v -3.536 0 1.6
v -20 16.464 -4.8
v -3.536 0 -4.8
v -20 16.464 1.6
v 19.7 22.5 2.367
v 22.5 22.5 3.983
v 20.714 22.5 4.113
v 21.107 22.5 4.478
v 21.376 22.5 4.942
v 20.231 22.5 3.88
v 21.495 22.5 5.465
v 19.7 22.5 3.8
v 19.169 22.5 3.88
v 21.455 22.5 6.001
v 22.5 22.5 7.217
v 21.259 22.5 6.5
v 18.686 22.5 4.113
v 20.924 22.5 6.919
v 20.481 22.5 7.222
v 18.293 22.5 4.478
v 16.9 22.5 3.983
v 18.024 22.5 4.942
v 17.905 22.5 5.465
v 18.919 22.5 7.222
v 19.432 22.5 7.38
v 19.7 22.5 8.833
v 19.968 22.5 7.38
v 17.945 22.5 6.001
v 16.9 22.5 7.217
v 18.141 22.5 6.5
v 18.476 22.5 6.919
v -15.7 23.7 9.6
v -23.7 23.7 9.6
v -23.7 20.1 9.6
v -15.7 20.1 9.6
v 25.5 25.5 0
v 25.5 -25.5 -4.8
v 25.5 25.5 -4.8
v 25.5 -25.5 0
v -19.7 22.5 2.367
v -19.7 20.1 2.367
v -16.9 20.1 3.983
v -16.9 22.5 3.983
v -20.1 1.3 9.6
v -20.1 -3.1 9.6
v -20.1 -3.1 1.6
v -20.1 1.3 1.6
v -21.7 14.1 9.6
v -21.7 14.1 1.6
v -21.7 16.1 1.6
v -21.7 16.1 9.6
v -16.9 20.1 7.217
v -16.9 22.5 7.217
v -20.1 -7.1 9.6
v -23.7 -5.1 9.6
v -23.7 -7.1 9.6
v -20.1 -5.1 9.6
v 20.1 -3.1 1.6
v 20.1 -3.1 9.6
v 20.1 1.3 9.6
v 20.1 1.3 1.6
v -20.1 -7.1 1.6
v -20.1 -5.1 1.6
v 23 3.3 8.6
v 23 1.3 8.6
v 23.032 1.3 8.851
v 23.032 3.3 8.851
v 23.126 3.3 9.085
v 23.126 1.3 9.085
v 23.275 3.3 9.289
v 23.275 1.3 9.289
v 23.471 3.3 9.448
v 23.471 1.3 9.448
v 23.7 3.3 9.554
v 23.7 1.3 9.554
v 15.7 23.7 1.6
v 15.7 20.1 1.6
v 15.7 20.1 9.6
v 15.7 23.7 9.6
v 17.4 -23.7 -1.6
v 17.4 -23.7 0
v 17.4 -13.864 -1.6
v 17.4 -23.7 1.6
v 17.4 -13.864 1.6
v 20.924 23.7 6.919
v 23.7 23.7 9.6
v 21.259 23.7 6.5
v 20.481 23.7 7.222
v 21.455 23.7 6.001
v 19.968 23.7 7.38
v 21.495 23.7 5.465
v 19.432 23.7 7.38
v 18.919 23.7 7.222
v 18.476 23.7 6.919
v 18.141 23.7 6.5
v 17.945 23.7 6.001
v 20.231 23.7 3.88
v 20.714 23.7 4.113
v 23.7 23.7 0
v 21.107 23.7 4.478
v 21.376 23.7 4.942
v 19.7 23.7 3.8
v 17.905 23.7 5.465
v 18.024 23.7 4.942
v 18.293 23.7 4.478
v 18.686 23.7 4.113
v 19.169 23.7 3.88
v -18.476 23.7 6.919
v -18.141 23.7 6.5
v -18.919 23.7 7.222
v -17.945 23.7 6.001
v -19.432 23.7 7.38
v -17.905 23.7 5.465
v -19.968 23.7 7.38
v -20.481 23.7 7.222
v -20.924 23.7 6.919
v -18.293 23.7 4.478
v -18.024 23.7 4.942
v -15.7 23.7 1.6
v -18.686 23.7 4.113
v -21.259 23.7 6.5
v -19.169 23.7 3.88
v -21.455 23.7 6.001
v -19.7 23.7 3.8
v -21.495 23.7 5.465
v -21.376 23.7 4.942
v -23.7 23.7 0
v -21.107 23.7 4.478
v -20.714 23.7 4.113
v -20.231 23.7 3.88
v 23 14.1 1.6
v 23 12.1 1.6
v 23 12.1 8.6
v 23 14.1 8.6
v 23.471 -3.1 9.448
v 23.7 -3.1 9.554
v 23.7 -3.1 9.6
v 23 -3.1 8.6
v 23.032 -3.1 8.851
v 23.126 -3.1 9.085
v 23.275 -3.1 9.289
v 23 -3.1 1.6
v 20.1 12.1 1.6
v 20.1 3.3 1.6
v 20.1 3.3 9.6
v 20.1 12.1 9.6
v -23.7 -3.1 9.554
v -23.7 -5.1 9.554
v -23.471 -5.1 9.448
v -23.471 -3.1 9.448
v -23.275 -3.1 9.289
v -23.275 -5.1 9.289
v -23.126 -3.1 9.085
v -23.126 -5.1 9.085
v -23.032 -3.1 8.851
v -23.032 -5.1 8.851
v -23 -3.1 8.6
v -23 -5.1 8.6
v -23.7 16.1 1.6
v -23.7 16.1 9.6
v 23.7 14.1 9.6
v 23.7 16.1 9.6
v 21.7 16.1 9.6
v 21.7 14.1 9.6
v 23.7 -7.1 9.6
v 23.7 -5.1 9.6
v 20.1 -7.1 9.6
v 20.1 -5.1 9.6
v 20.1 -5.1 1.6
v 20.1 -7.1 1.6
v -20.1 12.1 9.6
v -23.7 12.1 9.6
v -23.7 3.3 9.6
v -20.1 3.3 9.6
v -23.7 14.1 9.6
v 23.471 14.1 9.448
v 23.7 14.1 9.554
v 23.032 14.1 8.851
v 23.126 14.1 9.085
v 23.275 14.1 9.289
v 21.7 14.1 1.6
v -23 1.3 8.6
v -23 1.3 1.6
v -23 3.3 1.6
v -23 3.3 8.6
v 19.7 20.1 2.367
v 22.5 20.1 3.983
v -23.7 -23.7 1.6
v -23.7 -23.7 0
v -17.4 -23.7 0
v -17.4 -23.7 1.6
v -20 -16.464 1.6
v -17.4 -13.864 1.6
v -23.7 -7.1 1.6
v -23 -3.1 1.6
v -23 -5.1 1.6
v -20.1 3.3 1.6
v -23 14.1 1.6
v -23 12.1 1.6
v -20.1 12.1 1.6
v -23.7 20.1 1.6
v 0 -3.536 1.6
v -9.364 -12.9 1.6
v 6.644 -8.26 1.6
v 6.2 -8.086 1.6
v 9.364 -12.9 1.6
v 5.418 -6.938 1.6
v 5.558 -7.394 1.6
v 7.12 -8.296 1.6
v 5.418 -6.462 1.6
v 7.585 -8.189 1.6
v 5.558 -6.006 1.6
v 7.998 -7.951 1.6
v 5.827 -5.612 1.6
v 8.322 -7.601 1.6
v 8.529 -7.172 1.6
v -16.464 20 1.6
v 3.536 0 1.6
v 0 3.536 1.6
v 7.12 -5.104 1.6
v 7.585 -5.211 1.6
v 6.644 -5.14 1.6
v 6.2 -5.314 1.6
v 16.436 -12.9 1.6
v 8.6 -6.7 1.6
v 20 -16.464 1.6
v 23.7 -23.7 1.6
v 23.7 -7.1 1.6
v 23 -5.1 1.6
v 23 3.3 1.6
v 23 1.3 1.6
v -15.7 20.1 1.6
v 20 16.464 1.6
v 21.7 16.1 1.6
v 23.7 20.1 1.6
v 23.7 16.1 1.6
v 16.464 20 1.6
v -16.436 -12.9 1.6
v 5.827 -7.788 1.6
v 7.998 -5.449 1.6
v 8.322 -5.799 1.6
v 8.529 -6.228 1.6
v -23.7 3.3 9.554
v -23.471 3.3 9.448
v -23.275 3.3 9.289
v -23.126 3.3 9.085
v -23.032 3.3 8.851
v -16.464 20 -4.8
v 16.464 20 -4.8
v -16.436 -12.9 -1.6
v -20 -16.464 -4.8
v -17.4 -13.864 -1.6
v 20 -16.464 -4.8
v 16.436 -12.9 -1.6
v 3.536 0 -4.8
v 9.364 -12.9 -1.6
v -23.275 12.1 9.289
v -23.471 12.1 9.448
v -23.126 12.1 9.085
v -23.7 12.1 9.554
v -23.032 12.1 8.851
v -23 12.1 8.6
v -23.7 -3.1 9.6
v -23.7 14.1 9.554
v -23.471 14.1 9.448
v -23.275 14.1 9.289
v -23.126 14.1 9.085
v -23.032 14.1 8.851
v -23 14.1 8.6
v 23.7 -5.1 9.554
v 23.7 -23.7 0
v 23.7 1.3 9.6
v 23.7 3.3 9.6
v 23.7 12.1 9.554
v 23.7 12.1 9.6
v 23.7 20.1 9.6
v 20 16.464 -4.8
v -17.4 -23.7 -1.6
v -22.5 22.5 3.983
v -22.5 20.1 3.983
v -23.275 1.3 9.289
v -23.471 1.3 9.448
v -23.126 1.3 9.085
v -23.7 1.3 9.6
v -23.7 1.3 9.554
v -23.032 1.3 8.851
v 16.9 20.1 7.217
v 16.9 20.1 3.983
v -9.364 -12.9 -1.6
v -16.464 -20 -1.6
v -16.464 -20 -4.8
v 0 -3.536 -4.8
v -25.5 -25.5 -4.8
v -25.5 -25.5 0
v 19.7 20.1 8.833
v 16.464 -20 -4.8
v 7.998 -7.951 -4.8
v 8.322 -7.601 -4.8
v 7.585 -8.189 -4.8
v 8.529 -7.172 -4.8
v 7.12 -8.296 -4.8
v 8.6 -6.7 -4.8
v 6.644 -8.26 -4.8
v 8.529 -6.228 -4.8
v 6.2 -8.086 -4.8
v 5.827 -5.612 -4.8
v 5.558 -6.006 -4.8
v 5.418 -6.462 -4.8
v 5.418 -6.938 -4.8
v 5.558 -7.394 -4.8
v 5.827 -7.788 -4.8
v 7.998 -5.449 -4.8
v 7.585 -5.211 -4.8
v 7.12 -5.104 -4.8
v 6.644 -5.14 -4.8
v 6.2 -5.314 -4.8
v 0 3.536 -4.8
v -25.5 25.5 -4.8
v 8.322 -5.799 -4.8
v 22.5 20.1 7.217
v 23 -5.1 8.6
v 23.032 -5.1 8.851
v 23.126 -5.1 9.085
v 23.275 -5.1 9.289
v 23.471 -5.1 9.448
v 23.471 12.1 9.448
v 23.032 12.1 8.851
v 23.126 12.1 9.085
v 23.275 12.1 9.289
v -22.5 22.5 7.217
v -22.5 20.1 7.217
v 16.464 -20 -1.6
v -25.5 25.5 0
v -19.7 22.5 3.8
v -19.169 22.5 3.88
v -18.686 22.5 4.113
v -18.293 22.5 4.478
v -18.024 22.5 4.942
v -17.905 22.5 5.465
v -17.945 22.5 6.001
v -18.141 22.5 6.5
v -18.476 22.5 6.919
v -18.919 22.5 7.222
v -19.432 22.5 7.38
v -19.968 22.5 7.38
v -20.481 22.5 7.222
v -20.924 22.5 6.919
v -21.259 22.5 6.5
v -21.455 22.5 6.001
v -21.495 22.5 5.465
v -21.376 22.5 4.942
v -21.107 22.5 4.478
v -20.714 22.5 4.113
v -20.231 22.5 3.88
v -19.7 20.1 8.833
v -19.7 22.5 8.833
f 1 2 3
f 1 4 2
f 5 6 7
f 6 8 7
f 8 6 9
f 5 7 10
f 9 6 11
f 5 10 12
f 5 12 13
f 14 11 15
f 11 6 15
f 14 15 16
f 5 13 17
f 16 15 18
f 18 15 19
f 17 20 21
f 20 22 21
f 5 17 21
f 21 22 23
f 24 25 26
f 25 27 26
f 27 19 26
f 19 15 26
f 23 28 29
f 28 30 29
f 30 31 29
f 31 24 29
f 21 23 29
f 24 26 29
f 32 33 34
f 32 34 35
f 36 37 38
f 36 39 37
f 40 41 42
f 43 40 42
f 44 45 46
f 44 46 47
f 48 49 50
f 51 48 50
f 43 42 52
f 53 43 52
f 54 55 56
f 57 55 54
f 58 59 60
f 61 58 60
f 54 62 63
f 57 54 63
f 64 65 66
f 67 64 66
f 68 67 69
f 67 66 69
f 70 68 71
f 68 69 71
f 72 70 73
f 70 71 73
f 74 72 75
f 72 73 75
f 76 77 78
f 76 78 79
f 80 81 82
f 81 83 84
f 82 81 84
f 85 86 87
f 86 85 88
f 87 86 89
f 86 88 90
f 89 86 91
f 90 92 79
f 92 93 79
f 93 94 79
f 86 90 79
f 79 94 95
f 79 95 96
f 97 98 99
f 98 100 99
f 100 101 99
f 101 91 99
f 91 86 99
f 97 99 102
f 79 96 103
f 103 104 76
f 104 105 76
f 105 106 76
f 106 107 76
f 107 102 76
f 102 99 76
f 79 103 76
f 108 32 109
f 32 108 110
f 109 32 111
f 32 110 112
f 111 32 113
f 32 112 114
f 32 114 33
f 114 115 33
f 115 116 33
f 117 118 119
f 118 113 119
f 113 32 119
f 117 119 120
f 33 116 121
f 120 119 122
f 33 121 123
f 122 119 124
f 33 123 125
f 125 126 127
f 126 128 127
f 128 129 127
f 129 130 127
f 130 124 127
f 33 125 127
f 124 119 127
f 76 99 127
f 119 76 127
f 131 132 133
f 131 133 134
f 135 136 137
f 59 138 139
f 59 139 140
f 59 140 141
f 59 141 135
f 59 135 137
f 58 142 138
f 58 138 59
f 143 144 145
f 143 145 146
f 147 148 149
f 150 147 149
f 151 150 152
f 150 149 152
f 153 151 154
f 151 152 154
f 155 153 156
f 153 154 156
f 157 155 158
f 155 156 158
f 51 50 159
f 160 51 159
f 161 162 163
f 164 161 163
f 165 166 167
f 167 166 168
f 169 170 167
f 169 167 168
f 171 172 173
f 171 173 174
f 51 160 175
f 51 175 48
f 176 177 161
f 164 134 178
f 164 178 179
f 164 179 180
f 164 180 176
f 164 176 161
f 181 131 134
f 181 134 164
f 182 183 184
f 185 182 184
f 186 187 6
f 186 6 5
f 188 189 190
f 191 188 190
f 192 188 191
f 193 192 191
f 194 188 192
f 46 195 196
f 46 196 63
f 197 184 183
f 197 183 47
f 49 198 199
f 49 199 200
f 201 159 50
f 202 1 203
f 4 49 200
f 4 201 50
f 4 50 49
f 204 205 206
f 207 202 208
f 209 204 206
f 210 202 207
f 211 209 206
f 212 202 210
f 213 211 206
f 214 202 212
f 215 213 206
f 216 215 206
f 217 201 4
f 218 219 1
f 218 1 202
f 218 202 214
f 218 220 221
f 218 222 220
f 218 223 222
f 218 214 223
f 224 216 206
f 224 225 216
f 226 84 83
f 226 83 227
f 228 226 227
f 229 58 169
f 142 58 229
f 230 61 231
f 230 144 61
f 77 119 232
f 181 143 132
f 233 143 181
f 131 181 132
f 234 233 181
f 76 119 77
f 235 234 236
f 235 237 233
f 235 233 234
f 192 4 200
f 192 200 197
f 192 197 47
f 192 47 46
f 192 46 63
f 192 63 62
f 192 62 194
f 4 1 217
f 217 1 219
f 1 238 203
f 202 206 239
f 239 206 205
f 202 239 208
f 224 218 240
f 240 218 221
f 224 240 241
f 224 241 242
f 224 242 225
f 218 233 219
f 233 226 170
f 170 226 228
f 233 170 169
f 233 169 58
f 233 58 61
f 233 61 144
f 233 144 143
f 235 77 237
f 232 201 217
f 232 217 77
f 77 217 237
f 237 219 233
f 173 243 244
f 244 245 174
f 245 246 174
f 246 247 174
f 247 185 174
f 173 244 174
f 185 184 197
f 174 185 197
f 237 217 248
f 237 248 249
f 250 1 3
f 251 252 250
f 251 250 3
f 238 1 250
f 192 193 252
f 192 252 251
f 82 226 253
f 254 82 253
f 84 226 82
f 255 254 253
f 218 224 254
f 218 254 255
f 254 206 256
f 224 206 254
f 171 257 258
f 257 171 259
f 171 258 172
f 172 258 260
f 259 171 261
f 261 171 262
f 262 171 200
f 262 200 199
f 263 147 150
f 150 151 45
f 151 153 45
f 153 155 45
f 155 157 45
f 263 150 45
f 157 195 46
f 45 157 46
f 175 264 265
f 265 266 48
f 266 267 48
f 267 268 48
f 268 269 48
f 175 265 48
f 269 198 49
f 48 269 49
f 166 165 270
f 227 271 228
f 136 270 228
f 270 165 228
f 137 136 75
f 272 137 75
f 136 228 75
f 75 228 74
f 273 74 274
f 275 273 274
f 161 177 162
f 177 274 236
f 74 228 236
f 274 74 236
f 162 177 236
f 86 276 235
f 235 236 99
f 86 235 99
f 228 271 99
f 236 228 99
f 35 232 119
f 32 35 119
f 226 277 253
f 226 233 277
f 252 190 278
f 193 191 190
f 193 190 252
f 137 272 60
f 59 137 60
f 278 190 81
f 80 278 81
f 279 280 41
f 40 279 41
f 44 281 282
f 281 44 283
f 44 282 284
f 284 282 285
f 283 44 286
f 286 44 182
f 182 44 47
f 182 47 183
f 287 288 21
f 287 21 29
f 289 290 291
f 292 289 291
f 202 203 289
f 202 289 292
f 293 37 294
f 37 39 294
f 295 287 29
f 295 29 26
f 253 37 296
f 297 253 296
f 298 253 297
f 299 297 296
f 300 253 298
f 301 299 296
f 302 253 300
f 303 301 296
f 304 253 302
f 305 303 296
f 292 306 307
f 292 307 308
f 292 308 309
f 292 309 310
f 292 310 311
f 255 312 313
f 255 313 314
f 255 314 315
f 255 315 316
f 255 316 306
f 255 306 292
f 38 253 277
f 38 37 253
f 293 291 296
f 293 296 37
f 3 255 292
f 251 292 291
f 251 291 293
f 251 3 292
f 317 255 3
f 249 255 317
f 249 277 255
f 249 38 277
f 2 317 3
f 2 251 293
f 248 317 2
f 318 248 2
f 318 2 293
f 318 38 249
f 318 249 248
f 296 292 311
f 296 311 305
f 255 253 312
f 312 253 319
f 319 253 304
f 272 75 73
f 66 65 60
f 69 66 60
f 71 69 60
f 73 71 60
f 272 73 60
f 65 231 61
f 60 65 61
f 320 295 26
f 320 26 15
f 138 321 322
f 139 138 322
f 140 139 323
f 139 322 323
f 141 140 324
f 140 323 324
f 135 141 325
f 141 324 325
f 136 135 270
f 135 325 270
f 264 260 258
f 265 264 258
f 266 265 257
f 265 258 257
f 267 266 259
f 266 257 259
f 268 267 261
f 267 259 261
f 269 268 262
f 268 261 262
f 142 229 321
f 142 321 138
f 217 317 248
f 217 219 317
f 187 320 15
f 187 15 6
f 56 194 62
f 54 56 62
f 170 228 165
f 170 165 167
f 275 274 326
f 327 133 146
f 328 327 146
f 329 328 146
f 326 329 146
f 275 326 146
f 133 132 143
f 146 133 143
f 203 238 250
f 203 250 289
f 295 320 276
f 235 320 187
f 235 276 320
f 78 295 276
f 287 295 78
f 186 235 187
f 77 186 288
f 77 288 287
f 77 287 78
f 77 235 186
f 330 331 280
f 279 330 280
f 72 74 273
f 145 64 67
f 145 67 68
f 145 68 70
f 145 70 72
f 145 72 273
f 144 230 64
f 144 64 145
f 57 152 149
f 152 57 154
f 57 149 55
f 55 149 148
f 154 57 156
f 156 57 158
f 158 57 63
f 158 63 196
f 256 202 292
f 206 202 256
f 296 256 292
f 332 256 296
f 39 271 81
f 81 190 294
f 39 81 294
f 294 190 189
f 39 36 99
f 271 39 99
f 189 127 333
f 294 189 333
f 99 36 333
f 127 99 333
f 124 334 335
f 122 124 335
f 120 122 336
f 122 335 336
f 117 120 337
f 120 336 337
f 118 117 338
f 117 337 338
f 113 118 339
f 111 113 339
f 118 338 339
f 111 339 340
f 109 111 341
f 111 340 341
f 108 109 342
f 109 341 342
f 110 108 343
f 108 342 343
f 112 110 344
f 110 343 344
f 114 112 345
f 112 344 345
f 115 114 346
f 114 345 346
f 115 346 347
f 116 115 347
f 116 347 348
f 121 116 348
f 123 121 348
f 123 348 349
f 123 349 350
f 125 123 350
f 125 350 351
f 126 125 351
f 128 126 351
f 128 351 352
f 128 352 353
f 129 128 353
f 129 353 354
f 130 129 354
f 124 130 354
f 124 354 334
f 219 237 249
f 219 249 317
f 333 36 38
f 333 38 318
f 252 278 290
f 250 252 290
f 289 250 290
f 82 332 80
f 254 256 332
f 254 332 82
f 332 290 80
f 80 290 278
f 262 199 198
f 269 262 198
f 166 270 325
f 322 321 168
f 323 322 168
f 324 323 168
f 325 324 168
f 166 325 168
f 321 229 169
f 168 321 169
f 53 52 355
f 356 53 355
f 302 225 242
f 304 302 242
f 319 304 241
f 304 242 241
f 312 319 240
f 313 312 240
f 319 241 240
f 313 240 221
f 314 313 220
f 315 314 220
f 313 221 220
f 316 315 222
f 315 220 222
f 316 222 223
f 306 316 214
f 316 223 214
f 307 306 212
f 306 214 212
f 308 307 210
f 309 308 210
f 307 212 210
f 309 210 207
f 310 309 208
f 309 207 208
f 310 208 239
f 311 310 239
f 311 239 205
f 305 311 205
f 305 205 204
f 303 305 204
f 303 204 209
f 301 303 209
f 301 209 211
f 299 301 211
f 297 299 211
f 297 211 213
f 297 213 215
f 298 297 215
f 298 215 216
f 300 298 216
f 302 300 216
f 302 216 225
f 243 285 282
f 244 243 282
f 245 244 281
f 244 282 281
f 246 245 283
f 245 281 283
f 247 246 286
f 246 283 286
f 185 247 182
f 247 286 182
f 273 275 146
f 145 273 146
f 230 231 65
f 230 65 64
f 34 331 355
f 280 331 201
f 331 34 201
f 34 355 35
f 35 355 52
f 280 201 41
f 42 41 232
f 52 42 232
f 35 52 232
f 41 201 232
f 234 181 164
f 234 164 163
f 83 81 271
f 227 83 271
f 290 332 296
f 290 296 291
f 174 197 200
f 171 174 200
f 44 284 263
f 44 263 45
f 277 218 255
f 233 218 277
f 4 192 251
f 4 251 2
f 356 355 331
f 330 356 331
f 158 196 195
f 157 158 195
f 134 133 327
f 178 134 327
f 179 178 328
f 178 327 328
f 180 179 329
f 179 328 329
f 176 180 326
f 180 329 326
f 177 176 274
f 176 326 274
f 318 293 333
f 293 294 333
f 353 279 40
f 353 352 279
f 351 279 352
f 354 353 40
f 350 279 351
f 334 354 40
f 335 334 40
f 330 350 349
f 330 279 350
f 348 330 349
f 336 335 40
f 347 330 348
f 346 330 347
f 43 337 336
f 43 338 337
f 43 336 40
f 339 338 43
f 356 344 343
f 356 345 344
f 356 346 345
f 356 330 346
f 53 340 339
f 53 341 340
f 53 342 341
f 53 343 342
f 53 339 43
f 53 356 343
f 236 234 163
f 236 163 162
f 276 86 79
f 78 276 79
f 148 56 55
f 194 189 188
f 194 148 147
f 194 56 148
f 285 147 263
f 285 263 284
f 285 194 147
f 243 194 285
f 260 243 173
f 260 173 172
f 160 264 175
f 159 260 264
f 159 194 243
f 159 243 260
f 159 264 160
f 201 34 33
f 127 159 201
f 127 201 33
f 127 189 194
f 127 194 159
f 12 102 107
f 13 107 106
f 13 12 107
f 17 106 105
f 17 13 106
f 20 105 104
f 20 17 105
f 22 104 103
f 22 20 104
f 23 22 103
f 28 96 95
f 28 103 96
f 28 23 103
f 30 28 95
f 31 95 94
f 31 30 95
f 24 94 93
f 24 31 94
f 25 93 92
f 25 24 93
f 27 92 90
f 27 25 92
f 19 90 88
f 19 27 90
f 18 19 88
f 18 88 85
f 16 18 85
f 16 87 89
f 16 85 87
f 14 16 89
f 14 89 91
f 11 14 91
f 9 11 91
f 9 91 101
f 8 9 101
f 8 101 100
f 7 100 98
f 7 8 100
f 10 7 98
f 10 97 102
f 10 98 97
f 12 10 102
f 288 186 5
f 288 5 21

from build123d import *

# Parameters (mm, degrees)
ESBO_O3_W                = 47.4
ESBO_O3_H                = 47.4
RESSALTO_EXTRUS_O2_DEPTH = 1.6
ESBO_O5_W                = 51
ESBO_O5_H                = 51
RESSALTO_EXTRUS_O3_DEPTH = 1.6
CORTE_EXTRUS_O1_DEPTH    = 3.2
ESBO_O7_W                = 8
ESBO_O7_H                = 3.6
RESSALTO_EXTRUS_O4_DEPTH = 8
FILETE1_R                = 1
ESBO_O8_W                = 51
ESBO_O8_H                = 51
RESSALTO_EXTRUS_O5_DEPTH = 3.2
ESBO_O9_W                = 34.8
ESBO_O9_H                = 10.8
CORTE_EXTRUS_O2_DEPTH    = 3.2
ESBO_O10_R               = 1.6
CORTE_EXTRUS_O3_DEPTH    = 37.939139135
ESBO_O11_R               = 1.8
CORTE_EXTRUS_O4_DEPTH    = 2.4
ESBO_O11_2_R             = 1.8
CORTE_EXTRUS_O5_DEPTH    = 54.120335089


with BuildPart() as part:
    # Esboço3 → Ressalto-extrusão2 (new body)
    with BuildSketch(Plane.XY):
        Rectangle(ESBO_O3_W, ESBO_O3_H)
    extrude(amount=RESSALTO_EXTRUS_O2_DEPTH)

    # Esboço5 → Ressalto-extrusão3 (add)
    with BuildSketch(Plane(origin=(0, 0, 0), x_dir=(-1, 0, 0), z_dir=(0, 0, -1))):
        Rectangle(ESBO_O5_W, ESBO_O5_H)
    extrude(amount=RESSALTO_EXTRUS_O3_DEPTH)

    # Esboço6 → Corte-extrusão1 (cut)
    with BuildSketch(Plane(origin=(0, 0, -1.6), x_dir=(-1, 0, 0), z_dir=(0, 0, -1))):
        Polygon((3.535533906, 0), (20, 16.464466094), (20, -16.464466094), align=None)
        Polygon((-16.464466094, -20), (0, -3.535533906), (16.464466094, -20), align=None)
        Polygon((-20, 16.464466094), (-3.535533906, 0), (-20, -16.464466094), align=None)
        Polygon((-16.464466094, 20), (0, 3.535533906), (16.464466094, 20), align=None)
    extrude(amount=-CORTE_EXTRUS_O1_DEPTH, mode=Mode.SUBTRACT)

    # Esboço7 → Ressalto-extrusão4 (add)
    with BuildSketch(Plane.XY.offset(1.6)):
        Polygon((-23.7, 16.1), (-23.7, -7.1), (-20.1, -7.1), (-20.1, -5.1), (-23, -5.1), (-23, -3.1), (-20.1, -3.1), (-20.1, 1.3), (-23, 1.3), (-23, 3.3), (-20.1, 3.3), (-20.1, 12.1), (-23, 12.1), (-23, 14.1), (-21.7, 14.1), (-21.7, 16.1), align=None)
        with Locations((-19.7, 21.9)):
            Rectangle(ESBO_O7_W, ESBO_O7_H)
    ressalto_extrus_o4 = extrude(amount=RESSALTO_EXTRUS_O4_DEPTH)

    # Espelhar1: Ressalto-extrusão4 across plane
    add(ressalto_extrus_o4.mirror(Plane(origin=(0, 0, 0), x_dir=(0, 0, 1), z_dir=(1, 0, 0))))

    # Filete1
    # the kernel refuses this fillet: 1 mm, written as the material it takes off along each edge
    with BuildSketch(Plane(origin=(-23, 1.3, 9.6), x_dir=(-1, 0, 0), z_dir=(0, 1, 0)), Plane(origin=(-23, 12.1, 9.6), x_dir=(-1, 0, 0), z_dir=(0, 1, 0)), Plane(origin=(-23, -5.1, 9.6), x_dir=(-1, 0, 0), z_dir=(0, 1, 0))) as filete1_piece_1:
        with BuildLine():
            CenterArc((FILETE1_R, -FILETE1_R), FILETE1_R, 90, 90)
            Line((0, -FILETE1_R), (0, 0))
            Line((0, 0), (FILETE1_R, 0))
        make_face()
    extrude(amount=2, mode=Mode.SUBTRACT)
    with BuildSketch(Plane(origin=(23, 12.1, 9.6), x_dir=(1, 0, 0), z_dir=(0, 1, 0)), Plane(origin=(23, 1.3, 9.6), x_dir=(1, 0, 0), z_dir=(0, 1, 0)), Plane(origin=(23, -5.1, 9.6), x_dir=(1, 0, 0), z_dir=(0, 1, 0))) as filete1_piece_2:
        with BuildLine():
            CenterArc((FILETE1_R, FILETE1_R), FILETE1_R, 180, 90)
            Line((0, FILETE1_R), (0, 0))
            Line((0, 0), (FILETE1_R, 0))
        make_face()
    extrude(amount=2, mode=Mode.SUBTRACT)

    # Esboço8 → Ressalto-extrusão5 (add)
    with BuildSketch(Plane(origin=(0, 0, -1.6), x_dir=(-1, 0, 0), z_dir=(0, 0, -1))):
        Rectangle(ESBO_O8_W, ESBO_O8_H)
        Polygon((-16.464466094, -20), (16.464466094, -20), (0, -3.535533906), align=None, mode=Mode.SUBTRACT)
        Polygon((-20, -16.464466094), (-3.535533906, 0), (-20, 16.464466094), align=None, mode=Mode.SUBTRACT)
        Polygon((3.535533906, 0), (20, -16.464466094), (20, 16.464466094), align=None, mode=Mode.SUBTRACT)
        Polygon((0, 3.535533906), (16.464466094, 20), (-16.464466094, 20), align=None, mode=Mode.SUBTRACT)
    extrude(amount=RESSALTO_EXTRUS_O5_DEPTH)

    # Esboço9 → Corte-extrusão2 (cut)
    with BuildSketch(Plane.XY.offset(1.6)):
        with Locations((0, -18.3)):
            Rectangle(ESBO_O9_W, ESBO_O9_H)
    extrude(amount=-CORTE_EXTRUS_O2_DEPTH, mode=Mode.SUBTRACT)

    # Esboço10 → Corte-extrusão3 (cut, through all)
    with BuildSketch(Plane.XY.offset(1.6)):
        with Locations((7, -6.7)):
            Circle(ESBO_O10_R)
    extrude(amount=-CORTE_EXTRUS_O3_DEPTH, mode=Mode.SUBTRACT)

    # Esboço11 → Corte-extrusão4 (cut)
    with BuildSketch(Plane.XZ.offset(-20.1)):
        Polygon((-19.7, 8.833161507), (-22.5, 7.216580754), (-22.5, 3.983419246), (-19.7, 2.366838493), (-16.9, 3.983419246), (-16.9, 7.216580754), align=None)
        with Locations(Location((-19.7, 5.6, 0), (0, 0, 270))):
            Circle(ESBO_O11_R, mode=Mode.SUBTRACT)
    corte_extrus_o4 = extrude(amount=-CORTE_EXTRUS_O4_DEPTH, mode=Mode.SUBTRACT)

    # Esboço11<2> → Corte-extrusão5 (cut, through all)
    with BuildSketch(Plane.XZ.offset(-20.1)):
        with Locations(Location((-19.7, 5.6, 0), (0, 0, 270))):
            Circle(ESBO_O11_2_R)
    corte_extrus_o5 = extrude(amount=-CORTE_EXTRUS_O5_DEPTH, mode=Mode.SUBTRACT)

    # Espelhar2: Corte-extrusão4, Corte-extrusão5 across plane
    add(corte_extrus_o4.mirror(Plane(origin=(0, 0, 0), x_dir=(0, 0, 1), z_dir=(1, 0, 0))), mode=Mode.SUBTRACT)
    add(corte_extrus_o5.mirror(Plane(origin=(0, 0, 0), x_dir=(0, 0, 1), z_dir=(1, 0, 0))), mode=Mode.SUBTRACT)


solid = part.part
